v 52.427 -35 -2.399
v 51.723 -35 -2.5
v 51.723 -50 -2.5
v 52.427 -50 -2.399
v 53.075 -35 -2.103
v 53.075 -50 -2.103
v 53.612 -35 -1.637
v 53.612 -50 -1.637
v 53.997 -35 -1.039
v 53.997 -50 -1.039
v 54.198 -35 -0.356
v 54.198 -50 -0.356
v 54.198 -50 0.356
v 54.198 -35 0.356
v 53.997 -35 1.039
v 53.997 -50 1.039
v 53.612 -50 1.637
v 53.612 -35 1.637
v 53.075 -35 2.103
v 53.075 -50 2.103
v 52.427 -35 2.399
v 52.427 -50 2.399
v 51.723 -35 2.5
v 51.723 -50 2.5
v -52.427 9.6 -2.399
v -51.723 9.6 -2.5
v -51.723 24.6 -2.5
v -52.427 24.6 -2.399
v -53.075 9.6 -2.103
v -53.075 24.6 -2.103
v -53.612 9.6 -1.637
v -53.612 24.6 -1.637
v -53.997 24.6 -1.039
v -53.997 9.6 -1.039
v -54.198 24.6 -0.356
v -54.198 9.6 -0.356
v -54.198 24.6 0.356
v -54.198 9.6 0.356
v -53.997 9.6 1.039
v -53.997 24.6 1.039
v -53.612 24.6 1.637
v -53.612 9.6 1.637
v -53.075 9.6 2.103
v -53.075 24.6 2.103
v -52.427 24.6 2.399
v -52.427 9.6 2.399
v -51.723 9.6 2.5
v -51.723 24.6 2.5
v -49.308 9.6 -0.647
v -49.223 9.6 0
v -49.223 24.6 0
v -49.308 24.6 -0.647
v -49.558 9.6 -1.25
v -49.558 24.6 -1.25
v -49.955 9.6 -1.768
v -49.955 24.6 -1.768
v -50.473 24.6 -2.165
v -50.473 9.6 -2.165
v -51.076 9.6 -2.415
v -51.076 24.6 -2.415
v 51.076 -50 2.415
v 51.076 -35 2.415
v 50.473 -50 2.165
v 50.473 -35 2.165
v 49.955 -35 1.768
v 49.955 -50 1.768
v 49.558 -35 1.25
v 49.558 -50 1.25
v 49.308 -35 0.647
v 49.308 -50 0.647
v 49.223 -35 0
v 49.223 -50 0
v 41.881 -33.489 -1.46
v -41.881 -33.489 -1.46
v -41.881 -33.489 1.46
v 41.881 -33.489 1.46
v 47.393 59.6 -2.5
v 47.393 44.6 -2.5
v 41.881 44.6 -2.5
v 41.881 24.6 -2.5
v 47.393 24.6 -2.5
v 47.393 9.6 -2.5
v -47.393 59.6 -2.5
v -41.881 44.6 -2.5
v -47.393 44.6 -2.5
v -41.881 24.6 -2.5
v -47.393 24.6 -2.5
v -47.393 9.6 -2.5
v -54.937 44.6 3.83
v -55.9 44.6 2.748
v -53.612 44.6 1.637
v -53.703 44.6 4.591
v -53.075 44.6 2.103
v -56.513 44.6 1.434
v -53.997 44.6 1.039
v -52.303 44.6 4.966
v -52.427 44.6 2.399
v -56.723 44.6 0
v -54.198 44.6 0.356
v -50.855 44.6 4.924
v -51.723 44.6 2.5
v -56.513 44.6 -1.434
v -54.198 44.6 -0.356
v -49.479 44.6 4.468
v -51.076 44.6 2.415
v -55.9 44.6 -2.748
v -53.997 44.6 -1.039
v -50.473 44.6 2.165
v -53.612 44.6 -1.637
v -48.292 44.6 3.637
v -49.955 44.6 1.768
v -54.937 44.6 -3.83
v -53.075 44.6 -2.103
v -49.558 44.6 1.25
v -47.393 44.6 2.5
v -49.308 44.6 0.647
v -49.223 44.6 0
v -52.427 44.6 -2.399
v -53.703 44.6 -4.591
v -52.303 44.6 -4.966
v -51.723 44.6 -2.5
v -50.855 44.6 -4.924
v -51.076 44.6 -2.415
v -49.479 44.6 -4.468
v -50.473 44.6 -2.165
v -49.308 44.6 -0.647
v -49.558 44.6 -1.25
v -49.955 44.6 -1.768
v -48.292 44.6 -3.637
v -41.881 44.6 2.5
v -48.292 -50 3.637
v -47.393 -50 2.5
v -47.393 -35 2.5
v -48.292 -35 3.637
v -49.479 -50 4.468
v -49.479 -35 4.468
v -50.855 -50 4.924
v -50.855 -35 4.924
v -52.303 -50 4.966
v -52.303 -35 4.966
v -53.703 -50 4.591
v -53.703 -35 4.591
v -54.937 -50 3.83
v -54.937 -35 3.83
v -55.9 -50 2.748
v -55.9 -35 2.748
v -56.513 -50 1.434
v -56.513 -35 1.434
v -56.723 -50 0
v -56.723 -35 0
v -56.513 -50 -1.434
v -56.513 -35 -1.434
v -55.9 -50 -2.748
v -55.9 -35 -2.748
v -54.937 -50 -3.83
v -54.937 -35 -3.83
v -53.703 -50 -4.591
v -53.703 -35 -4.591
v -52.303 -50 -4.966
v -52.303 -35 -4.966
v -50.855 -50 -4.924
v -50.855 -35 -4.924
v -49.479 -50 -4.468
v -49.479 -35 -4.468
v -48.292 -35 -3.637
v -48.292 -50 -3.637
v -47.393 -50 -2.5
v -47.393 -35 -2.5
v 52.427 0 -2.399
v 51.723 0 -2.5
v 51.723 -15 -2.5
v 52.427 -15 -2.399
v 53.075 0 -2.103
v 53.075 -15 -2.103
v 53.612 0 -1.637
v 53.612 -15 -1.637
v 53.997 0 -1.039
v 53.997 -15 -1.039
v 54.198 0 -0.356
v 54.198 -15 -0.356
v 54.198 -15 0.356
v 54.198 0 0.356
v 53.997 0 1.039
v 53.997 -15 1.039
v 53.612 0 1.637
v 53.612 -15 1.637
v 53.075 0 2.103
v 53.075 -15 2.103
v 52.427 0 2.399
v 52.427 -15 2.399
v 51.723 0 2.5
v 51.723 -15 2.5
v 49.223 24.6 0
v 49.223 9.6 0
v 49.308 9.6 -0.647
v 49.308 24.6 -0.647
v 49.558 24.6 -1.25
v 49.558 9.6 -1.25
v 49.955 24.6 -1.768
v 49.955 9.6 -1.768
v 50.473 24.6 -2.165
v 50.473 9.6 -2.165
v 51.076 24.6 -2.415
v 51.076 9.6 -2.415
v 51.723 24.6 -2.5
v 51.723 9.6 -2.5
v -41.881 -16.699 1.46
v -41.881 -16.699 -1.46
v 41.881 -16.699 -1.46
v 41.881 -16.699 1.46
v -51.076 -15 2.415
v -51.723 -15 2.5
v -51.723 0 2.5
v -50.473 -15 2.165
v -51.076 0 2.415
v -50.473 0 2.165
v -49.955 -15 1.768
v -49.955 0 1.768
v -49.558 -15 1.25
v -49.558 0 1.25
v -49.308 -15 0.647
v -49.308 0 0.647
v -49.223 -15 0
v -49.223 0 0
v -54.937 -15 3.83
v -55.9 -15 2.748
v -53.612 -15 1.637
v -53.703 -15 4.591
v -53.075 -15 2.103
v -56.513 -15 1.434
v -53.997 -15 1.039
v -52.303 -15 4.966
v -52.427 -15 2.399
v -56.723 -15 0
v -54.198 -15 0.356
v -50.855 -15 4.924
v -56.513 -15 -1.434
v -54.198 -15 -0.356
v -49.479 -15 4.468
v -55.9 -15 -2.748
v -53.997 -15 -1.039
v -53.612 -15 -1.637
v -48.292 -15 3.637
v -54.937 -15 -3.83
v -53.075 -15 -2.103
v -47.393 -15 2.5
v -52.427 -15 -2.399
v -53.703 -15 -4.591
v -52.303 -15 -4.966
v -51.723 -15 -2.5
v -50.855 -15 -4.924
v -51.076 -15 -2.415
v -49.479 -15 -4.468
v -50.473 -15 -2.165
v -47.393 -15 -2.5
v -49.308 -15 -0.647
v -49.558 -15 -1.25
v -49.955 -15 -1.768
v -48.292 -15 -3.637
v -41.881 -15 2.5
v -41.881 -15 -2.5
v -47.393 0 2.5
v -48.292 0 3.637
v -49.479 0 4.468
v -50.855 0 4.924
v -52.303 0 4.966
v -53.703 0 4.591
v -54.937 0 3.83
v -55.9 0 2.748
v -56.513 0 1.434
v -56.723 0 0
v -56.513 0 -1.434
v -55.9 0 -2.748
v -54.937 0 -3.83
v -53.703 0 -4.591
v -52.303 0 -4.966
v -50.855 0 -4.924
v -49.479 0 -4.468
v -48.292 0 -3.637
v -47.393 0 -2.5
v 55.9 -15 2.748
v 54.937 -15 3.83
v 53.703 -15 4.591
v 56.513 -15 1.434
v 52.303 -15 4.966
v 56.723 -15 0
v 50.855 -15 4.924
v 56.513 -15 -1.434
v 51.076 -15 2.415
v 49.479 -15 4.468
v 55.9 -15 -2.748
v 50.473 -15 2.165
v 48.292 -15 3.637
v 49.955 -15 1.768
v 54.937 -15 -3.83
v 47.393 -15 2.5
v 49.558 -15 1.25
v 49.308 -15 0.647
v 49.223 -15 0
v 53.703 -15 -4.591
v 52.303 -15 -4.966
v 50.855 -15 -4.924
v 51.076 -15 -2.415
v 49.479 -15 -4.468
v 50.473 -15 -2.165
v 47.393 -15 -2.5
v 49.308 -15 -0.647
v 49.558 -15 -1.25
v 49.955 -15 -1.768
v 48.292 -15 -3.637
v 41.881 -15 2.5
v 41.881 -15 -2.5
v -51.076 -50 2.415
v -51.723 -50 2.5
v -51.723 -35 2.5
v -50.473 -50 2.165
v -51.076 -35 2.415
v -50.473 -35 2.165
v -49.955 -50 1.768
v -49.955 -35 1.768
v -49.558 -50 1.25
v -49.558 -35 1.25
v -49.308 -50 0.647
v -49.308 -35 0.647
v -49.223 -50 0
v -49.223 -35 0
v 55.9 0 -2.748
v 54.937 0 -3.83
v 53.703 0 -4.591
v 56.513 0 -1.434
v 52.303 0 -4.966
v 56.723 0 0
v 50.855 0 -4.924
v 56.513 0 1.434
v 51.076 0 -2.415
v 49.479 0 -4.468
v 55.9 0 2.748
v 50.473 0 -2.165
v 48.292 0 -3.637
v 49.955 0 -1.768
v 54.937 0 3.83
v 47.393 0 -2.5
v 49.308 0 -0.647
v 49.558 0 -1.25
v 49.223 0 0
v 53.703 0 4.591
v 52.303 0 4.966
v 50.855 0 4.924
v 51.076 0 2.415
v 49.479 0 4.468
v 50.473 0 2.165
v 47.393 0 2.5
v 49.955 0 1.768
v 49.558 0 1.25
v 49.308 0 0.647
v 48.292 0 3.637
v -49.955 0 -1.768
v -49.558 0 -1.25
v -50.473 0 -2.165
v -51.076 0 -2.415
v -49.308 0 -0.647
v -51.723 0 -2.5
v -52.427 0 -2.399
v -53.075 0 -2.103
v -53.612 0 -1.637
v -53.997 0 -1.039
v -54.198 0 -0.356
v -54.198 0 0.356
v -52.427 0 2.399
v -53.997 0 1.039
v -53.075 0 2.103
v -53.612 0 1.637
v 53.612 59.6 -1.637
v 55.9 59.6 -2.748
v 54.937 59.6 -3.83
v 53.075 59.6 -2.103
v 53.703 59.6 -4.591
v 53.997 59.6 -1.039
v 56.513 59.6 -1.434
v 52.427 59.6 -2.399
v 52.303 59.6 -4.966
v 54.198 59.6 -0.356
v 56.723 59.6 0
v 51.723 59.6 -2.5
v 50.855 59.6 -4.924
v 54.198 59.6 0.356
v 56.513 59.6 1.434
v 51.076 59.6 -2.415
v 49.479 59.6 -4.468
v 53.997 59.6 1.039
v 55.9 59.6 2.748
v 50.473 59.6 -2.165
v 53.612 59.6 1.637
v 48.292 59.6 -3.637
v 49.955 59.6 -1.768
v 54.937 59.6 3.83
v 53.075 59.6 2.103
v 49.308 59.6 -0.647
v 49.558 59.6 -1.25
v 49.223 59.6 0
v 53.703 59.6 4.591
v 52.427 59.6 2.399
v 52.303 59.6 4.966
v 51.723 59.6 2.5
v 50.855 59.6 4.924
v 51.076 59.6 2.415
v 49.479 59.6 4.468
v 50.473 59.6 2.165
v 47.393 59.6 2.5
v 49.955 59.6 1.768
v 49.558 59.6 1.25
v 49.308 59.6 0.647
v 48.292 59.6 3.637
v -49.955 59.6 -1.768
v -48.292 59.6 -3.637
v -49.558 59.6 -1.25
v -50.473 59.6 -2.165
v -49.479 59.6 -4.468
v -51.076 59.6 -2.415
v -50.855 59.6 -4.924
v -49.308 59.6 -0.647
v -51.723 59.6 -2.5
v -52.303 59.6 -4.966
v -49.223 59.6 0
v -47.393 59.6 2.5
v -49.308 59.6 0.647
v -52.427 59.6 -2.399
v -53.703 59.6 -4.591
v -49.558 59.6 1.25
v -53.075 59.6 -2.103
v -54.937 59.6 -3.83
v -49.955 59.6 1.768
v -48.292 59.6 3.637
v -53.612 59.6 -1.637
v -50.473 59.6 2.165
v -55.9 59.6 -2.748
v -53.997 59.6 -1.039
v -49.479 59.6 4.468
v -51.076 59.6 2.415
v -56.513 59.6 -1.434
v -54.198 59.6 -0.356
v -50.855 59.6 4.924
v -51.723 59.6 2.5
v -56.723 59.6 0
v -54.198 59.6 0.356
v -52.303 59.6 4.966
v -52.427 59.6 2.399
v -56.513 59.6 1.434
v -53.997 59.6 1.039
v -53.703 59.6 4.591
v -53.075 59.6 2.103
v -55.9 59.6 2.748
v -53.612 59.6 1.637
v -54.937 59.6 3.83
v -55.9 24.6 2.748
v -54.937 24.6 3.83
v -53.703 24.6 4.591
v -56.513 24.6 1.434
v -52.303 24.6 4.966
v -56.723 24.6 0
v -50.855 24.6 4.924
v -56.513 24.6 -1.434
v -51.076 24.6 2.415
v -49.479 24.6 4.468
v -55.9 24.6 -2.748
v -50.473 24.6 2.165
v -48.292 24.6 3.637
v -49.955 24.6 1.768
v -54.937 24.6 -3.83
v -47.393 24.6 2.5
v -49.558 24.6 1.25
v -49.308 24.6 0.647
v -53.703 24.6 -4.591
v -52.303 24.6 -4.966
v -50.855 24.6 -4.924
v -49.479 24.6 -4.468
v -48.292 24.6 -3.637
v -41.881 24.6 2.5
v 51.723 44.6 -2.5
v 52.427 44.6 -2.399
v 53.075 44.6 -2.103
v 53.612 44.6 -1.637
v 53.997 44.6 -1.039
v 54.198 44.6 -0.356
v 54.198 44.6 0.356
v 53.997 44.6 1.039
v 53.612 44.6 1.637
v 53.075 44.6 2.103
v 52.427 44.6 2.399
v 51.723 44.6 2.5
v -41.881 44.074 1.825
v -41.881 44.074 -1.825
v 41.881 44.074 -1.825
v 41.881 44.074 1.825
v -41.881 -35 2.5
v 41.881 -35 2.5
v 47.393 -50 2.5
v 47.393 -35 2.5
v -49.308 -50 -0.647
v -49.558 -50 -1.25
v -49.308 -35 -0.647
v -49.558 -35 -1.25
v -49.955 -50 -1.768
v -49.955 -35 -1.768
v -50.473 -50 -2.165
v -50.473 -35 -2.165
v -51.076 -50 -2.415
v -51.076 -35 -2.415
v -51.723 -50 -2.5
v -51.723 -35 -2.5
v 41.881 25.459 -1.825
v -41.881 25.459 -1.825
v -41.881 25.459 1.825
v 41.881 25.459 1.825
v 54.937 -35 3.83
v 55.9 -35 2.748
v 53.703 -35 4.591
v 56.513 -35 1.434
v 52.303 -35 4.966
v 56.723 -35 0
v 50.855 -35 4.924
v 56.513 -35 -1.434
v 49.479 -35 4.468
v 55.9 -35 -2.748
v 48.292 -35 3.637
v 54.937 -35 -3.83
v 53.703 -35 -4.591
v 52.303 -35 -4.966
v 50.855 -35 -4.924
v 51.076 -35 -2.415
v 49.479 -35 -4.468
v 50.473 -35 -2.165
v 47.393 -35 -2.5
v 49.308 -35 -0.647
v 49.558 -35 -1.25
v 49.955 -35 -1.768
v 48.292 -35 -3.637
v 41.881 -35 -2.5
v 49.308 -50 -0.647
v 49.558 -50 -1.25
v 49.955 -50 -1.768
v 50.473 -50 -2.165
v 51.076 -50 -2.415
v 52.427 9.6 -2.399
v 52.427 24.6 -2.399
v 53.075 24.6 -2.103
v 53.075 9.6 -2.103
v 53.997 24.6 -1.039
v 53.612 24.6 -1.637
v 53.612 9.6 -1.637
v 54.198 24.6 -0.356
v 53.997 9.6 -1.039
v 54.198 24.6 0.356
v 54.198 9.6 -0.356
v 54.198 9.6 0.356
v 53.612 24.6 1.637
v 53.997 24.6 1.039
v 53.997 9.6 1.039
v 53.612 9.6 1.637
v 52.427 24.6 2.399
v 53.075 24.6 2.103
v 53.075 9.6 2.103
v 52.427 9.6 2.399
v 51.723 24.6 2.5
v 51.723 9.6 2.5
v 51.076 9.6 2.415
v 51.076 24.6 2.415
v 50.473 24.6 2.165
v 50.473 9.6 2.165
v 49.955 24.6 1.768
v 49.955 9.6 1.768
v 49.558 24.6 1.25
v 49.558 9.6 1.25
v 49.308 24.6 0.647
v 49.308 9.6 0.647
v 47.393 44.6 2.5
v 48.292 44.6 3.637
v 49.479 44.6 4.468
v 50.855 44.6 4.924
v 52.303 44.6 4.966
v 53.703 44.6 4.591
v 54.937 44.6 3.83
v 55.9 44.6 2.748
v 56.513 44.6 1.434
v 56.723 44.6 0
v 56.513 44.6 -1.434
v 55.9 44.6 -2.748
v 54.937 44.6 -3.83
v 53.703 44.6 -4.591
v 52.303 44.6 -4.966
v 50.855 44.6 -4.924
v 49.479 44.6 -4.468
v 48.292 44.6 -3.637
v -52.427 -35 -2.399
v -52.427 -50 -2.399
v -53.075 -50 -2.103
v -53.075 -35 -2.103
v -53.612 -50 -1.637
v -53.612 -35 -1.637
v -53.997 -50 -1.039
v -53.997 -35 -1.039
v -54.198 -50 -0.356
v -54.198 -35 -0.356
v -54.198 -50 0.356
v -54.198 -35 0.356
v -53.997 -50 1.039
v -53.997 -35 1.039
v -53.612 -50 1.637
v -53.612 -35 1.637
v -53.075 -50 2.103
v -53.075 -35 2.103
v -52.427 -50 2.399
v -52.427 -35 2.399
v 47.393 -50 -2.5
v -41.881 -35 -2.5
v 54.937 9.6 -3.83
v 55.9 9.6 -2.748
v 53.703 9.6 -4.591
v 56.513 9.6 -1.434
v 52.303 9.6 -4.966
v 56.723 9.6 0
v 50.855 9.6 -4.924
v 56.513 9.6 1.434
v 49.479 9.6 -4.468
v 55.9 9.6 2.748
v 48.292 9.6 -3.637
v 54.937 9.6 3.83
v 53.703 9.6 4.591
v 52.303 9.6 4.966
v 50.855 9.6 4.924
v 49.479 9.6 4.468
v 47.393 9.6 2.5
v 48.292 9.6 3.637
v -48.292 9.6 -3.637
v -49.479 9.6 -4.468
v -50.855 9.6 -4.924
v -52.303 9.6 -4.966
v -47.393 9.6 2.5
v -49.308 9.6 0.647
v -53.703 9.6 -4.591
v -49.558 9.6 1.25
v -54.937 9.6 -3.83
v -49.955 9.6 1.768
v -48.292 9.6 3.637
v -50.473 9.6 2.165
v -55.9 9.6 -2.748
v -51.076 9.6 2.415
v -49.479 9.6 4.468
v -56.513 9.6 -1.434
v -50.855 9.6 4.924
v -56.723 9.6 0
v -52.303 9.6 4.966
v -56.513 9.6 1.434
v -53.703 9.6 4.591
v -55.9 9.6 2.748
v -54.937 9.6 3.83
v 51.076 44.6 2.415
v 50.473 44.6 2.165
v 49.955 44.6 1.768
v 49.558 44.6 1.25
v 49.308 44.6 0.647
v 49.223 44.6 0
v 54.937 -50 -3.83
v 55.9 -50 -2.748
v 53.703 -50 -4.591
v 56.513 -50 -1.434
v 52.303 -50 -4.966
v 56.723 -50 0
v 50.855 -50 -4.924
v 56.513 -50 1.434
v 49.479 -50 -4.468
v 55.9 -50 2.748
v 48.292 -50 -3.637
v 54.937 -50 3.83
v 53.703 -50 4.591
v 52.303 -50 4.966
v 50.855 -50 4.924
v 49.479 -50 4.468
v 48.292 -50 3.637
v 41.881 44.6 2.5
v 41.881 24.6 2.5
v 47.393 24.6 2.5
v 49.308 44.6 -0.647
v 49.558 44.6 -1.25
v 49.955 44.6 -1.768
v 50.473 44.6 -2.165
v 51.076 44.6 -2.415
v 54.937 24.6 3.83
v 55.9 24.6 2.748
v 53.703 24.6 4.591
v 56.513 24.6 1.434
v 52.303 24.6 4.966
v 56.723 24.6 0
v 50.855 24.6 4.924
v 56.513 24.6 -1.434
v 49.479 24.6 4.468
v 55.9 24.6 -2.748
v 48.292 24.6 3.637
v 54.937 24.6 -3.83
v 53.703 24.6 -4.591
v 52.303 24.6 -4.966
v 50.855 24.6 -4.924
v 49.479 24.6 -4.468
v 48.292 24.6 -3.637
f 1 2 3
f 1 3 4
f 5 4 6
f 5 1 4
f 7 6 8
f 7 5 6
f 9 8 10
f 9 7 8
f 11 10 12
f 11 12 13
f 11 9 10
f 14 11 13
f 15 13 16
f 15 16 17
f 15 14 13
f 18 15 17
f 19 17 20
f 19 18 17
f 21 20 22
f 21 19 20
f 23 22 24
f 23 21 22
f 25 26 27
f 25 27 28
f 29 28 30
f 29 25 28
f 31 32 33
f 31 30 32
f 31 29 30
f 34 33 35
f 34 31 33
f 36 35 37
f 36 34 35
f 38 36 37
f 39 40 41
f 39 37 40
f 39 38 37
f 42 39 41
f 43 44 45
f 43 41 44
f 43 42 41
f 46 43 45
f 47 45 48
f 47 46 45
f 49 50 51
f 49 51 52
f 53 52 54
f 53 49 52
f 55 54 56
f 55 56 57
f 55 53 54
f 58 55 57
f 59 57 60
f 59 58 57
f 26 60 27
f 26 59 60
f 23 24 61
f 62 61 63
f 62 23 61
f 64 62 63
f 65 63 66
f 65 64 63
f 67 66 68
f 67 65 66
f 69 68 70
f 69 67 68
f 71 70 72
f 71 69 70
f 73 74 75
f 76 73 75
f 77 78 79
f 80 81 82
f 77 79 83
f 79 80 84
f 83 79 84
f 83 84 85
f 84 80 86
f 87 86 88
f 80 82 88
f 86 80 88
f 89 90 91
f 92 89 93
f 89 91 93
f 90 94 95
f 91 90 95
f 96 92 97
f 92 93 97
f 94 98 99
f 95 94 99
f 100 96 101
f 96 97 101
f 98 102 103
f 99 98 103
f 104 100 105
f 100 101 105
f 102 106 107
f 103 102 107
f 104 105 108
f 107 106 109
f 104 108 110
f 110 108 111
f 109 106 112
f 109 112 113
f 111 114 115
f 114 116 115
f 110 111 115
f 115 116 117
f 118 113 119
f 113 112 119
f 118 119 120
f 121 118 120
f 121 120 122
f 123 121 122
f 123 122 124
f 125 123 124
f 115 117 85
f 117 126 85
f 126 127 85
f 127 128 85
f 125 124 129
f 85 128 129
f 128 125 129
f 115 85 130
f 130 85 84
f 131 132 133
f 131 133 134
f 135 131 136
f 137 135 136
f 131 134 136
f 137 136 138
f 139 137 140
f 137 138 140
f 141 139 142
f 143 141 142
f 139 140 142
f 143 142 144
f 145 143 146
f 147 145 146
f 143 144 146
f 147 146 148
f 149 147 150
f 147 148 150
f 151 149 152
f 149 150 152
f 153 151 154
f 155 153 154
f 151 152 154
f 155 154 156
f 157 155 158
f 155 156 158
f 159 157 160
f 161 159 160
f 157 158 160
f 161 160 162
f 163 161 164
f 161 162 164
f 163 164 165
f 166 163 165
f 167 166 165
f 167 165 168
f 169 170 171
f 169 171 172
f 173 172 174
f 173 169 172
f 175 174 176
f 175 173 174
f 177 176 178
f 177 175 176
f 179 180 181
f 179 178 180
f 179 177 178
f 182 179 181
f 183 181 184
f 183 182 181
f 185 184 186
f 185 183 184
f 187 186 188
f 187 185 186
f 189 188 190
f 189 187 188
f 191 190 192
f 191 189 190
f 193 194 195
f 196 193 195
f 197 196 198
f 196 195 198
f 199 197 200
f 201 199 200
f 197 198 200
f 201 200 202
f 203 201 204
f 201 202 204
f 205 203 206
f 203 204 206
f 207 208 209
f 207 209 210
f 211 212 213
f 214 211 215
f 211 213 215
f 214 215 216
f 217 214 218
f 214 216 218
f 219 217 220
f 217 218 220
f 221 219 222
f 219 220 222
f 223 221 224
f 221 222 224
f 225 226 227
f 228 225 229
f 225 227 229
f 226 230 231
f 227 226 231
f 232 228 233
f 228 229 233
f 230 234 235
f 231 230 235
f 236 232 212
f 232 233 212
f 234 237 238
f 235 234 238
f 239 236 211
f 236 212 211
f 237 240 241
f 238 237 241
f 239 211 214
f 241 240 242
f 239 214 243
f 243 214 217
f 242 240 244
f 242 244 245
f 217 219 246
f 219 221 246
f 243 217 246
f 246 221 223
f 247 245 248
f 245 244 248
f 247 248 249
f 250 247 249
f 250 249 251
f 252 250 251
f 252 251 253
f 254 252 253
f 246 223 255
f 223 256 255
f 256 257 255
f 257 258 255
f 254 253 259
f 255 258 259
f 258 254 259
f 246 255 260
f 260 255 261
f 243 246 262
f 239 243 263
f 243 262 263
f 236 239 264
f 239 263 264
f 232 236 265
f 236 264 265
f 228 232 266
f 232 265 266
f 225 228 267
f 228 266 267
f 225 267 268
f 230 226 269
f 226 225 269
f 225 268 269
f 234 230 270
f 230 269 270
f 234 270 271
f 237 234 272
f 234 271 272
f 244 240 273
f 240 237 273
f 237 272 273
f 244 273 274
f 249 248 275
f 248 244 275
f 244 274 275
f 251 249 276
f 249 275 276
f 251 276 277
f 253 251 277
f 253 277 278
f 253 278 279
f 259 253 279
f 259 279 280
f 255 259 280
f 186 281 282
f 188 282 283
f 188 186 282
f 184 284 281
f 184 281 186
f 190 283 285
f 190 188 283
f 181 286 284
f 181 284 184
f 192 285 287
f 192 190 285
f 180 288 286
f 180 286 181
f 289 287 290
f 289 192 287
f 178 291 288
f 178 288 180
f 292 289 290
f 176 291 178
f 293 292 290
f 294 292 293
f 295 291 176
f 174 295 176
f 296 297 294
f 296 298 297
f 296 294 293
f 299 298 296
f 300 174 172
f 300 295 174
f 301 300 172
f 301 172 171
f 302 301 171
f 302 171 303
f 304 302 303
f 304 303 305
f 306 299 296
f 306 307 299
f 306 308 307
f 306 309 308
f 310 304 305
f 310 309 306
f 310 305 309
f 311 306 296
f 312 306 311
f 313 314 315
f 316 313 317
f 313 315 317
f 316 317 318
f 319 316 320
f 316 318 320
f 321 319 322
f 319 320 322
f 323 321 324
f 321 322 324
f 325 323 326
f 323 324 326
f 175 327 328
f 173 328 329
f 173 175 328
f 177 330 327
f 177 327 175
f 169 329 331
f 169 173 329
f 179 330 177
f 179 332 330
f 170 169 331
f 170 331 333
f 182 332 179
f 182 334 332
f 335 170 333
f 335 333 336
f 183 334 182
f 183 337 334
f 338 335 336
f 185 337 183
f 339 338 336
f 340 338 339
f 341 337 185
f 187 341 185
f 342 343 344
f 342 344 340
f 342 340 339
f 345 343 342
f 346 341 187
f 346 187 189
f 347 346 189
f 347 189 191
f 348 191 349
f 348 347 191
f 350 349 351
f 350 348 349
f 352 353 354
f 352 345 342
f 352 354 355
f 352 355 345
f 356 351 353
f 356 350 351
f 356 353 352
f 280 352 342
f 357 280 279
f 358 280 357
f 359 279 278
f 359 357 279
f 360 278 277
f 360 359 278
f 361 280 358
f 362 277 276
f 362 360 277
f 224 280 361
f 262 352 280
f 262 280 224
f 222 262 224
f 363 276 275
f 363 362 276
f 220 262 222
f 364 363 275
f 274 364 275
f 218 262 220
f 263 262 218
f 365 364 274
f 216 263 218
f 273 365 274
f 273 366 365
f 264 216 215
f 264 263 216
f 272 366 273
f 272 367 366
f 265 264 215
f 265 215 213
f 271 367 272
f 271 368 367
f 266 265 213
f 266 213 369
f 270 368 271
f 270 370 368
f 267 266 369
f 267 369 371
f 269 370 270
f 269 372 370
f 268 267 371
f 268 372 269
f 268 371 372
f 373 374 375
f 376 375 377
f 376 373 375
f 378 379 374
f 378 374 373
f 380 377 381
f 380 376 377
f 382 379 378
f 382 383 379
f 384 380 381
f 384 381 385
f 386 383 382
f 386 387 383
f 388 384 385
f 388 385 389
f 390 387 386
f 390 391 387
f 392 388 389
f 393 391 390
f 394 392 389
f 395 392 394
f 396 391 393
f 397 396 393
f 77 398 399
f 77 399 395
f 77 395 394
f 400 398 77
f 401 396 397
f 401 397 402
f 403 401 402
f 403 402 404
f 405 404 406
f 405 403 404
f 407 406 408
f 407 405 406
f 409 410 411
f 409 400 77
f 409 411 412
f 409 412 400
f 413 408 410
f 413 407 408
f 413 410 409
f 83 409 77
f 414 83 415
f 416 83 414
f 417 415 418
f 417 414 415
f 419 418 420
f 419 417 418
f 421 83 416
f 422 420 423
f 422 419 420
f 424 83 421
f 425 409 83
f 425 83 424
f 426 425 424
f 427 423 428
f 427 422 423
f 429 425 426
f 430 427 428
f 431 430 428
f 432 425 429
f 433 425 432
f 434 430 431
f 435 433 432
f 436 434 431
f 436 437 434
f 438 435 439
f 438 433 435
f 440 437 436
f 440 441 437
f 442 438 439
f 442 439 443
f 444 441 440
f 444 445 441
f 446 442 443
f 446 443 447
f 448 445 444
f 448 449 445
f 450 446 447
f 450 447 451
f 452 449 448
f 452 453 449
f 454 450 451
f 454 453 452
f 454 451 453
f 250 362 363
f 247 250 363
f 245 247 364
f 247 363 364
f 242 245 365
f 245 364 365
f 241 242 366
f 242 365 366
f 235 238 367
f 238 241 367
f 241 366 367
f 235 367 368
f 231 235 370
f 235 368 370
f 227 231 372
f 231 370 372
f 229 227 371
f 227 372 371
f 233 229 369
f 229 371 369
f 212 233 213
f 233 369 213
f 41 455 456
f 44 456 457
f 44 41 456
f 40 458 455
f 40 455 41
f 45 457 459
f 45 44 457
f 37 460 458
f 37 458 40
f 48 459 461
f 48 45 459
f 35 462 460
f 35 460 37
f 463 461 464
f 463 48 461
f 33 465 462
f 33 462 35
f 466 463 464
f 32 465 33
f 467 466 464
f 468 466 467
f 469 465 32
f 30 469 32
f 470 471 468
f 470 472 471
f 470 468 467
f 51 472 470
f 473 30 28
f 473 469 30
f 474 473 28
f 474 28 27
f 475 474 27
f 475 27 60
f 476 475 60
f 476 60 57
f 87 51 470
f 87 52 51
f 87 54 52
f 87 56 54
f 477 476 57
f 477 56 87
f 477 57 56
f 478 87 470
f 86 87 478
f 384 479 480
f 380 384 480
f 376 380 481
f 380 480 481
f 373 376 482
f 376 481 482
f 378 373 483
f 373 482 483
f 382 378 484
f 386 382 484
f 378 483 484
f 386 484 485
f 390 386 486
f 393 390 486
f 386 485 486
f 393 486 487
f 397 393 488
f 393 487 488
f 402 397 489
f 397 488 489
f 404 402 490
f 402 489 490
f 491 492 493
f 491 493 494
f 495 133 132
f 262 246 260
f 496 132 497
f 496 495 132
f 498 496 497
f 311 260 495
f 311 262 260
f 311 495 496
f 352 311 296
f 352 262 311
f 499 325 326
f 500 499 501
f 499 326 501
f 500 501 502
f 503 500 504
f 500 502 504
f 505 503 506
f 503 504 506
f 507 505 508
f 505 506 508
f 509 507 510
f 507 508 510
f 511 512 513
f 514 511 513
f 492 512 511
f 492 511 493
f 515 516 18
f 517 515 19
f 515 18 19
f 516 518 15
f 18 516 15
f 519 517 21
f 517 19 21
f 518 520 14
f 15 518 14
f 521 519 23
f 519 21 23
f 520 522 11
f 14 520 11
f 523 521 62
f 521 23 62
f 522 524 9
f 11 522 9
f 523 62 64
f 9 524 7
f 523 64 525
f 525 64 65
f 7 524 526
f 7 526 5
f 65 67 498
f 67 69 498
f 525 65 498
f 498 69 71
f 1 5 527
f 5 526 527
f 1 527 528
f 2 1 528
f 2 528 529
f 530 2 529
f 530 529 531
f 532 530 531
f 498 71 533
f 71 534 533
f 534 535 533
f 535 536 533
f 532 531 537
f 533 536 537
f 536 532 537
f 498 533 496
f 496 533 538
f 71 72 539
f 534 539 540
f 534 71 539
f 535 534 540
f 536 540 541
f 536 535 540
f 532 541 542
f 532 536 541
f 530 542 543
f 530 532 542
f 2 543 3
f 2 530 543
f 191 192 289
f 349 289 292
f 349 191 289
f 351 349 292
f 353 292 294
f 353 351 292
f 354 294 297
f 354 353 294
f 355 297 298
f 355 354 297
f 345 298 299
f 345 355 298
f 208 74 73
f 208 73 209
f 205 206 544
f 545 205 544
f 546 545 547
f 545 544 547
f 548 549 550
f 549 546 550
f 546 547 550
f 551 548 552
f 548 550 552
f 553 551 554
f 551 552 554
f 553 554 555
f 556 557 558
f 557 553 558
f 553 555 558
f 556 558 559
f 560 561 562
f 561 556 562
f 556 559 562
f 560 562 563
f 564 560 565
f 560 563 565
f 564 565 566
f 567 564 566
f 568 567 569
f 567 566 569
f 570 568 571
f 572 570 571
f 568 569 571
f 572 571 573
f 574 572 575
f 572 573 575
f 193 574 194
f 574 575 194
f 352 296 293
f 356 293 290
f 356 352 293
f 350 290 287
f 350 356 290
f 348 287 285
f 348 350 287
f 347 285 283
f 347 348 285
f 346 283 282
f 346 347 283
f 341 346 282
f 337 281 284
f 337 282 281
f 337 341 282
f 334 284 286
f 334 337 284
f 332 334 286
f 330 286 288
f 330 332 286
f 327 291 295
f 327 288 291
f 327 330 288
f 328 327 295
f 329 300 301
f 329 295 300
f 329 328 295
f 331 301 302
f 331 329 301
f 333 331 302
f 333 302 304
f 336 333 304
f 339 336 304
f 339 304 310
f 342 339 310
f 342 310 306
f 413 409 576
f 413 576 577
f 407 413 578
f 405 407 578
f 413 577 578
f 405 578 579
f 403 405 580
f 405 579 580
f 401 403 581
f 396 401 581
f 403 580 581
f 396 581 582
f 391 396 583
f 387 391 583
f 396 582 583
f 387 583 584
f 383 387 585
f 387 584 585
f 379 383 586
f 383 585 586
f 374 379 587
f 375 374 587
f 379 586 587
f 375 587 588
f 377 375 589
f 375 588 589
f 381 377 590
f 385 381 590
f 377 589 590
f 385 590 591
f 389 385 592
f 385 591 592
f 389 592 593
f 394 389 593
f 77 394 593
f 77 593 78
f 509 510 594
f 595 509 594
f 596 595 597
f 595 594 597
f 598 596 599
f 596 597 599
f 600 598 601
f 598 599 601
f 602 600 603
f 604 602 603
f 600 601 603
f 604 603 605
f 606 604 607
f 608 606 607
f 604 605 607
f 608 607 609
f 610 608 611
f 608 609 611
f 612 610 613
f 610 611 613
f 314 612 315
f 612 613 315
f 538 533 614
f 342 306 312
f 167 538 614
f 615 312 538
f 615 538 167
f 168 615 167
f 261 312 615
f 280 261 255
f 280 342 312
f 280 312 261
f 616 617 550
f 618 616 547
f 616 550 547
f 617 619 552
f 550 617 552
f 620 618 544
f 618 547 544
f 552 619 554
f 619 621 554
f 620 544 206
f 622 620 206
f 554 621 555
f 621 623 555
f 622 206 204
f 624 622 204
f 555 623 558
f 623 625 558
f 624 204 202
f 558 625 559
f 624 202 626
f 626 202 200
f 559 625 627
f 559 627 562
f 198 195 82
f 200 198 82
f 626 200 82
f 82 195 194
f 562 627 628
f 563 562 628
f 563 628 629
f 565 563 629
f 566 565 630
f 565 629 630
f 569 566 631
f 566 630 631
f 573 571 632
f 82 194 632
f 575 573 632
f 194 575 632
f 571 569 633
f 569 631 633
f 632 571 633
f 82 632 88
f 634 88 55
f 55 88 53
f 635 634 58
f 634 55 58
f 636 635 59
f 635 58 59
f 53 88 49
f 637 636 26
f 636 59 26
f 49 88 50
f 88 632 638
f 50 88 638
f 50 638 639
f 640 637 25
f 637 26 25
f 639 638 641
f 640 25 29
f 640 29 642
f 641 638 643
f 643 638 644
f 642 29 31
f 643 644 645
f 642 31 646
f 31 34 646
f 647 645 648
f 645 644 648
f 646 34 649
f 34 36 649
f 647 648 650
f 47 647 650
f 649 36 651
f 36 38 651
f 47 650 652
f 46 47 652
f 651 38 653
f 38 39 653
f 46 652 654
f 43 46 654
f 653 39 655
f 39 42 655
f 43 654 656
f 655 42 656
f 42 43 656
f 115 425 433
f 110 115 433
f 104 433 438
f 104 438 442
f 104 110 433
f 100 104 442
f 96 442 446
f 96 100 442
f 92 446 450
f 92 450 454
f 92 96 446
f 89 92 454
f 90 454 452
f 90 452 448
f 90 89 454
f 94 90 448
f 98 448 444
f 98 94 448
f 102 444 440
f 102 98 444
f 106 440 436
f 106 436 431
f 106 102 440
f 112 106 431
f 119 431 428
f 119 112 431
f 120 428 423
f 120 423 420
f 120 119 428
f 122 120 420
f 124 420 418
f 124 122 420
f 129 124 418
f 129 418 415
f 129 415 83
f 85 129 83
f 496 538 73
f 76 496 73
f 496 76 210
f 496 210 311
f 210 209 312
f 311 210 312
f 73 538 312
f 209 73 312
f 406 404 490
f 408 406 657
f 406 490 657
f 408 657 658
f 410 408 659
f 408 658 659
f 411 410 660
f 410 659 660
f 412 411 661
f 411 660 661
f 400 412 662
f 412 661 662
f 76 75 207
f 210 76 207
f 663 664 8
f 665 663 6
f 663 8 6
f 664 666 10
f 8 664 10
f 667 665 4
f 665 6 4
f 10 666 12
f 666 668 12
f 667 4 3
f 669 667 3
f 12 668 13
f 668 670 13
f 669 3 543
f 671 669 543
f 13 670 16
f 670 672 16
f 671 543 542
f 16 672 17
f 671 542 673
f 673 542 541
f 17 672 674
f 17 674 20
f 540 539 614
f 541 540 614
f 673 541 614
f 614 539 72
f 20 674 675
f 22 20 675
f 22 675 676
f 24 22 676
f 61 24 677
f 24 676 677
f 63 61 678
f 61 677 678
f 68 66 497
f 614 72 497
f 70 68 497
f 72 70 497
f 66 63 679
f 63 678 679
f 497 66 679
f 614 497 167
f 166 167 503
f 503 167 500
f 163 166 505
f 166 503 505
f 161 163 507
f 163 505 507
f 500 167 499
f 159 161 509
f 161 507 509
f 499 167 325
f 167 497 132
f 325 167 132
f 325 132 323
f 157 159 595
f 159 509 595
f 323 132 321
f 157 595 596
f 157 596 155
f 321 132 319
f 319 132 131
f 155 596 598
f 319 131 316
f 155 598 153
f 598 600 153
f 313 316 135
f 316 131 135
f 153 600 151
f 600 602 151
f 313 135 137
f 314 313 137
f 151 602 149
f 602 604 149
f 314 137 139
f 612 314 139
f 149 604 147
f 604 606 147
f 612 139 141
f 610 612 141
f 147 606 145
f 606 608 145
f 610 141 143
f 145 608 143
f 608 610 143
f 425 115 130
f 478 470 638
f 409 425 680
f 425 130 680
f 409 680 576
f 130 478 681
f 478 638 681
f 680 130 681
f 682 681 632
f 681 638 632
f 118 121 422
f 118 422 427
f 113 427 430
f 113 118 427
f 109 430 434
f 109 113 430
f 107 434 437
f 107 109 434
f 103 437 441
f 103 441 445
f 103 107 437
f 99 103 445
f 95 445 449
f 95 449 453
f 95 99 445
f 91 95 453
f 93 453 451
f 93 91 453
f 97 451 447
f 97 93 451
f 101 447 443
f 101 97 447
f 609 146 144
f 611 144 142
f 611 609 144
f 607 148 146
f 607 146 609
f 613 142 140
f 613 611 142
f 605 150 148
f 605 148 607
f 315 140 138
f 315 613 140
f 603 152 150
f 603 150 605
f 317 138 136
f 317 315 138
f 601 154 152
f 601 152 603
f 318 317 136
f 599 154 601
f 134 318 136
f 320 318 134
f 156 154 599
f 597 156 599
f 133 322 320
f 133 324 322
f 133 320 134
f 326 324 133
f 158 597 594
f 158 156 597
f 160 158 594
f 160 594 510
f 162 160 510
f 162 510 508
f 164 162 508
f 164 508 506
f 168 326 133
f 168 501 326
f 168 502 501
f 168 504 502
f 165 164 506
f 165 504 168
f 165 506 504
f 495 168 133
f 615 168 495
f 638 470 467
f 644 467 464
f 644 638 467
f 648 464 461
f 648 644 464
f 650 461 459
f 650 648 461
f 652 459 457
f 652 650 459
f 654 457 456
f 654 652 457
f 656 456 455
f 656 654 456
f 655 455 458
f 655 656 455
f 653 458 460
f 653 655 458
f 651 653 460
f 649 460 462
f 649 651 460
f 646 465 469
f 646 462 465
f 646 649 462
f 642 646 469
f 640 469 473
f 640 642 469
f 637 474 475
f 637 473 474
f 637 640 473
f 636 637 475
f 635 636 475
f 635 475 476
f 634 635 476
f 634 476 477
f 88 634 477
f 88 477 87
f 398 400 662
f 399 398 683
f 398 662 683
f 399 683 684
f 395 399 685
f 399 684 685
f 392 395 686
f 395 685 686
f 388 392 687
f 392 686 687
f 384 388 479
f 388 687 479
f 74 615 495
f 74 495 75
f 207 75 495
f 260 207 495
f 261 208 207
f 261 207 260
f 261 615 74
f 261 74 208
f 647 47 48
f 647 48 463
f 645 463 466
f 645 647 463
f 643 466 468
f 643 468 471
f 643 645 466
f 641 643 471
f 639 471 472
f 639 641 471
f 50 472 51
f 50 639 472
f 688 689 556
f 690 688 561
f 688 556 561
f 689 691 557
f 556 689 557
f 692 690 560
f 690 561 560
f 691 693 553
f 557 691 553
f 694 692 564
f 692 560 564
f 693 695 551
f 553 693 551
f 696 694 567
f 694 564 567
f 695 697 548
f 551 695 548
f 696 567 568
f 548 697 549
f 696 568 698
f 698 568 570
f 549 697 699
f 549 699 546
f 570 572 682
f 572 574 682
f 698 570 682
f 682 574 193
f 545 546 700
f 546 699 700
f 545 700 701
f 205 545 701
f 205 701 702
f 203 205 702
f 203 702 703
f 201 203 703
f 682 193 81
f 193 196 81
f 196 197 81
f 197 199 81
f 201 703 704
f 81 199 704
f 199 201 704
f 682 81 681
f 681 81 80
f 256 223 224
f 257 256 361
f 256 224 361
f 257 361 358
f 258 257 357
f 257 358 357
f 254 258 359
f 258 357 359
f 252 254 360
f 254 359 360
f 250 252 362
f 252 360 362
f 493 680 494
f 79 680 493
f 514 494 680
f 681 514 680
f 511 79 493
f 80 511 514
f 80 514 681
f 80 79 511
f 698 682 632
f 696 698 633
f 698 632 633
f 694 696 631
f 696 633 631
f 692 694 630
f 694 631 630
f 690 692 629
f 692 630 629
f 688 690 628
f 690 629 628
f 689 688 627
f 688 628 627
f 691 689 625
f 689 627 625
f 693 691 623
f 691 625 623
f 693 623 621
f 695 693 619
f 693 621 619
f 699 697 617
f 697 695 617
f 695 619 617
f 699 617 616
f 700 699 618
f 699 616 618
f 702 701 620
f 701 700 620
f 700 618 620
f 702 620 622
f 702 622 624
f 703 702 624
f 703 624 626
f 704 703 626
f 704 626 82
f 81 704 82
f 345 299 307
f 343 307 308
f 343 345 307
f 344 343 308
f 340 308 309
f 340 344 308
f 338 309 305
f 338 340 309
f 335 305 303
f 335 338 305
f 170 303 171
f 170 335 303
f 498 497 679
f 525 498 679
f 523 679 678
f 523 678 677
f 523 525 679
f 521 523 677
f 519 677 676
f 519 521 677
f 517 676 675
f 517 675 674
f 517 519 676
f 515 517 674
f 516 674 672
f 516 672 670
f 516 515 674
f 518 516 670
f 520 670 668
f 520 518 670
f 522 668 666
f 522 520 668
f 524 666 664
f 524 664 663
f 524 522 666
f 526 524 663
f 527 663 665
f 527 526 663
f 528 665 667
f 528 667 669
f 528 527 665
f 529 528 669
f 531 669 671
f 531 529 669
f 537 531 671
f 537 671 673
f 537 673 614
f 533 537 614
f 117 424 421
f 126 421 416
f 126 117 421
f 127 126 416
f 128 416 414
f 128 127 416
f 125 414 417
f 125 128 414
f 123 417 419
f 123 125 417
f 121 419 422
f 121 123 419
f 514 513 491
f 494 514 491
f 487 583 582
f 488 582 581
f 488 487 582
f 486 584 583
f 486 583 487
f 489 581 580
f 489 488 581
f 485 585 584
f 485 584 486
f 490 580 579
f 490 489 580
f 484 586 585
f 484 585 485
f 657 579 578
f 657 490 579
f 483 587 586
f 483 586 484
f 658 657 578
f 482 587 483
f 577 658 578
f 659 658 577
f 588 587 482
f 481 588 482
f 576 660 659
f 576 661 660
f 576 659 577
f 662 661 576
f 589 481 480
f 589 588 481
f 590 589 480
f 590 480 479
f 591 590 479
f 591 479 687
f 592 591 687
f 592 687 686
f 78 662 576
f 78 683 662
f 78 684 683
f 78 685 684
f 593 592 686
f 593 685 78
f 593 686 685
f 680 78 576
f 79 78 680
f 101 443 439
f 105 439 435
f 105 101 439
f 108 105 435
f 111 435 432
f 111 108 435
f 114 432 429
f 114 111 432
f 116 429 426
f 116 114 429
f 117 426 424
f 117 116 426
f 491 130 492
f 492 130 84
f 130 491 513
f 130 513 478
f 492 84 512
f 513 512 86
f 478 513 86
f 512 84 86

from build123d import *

# Parameters (mm, degrees)
F1_DEPTH       = 50
F2_W           = 28.940089047
F2_H           = 20
F3_DEPTH       = 25
F3_DEPTH_BACK  = 25
F4_W           = 72.1798986197
F4_H           = 54.933372885
F5_DEPTH       = 25
F5_DEPTH_BACK  = 25
F9_W           = 16.7902670801
F9_H           = 2.9200464487
F10_DEPTH      = 63
F10_DEPTH_BACK = 65.8
F11_W          = 18.6153054237
F11_H          = 3.6500580609
F12_DEPTH      = 56.8
F12_DEPTH_BACK = 55.3


with BuildPart() as f1:
    # F0 (on Front) → F1 (new body)
    with BuildSketch(Plane.XZ):
        with BuildLine():
            ThreePointArc((55.5247060955, -2.5), (53.0247060955, 0), (55.5247060955, 2.5))
            Line((55.5247060955, 2.5), (51.1945790765, 2.5))
            ThreePointArc((51.1945790765, 2.5), (50.5247060955, 0), (51.1945790765, -2.5))
            Line((51.1945790765, -2.5), (55.5247060955, -2.5))
        make_face()
        with BuildLine():
            Line((51.1945790765, 2.5), (55.5247060955, 2.5))
            ThreePointArc((55.5247060955, 2.5), (57.2924730484, 1.767766953), (58.0247060955, 0))
            ThreePointArc((58.0247060955, 0), (57.2924730484, -1.767766953), (55.5247060955, -2.5))
            Line((55.5247060955, -2.5), (51.1945790765, -2.5))
            ThreePointArc((51.1945790765, -2.5), (56.818801321, -4.8296291314), (60.5247060955, 0))
            ThreePointArc((60.5247060955, 0), (56.818801321, 4.8296291314), (51.1945790765, 2.5))
        make_face()
        with BuildLine():
            ThreePointArc((51.1945790765, -2.5), (50.5247060955, 0), (51.1945790765, 2.5))
            Line((51.1945790765, 2.5), (-47.3928899846, 2.5))
            ThreePointArc((-47.3928899846, 2.5), (-46.893387872, 1.2940952255), (-46.7230170035, 0))
            ThreePointArc((-46.7230170035, 0), (-46.893387872, -1.2940952255), (-47.3928899846, -2.5))
            Line((-47.3928899846, -2.5), (51.1945790765, -2.5))
        make_face()
        with BuildLine():
            ThreePointArc((-46.7230170035, 0), (-46.893387872, 1.2940952255), (-47.3928899846, 2.5))
            Line((-47.3928899846, 2.5), (-51.7230170035, 2.5))
            ThreePointArc((-51.7230170035, 2.5), (-49.9552500505, 1.767766953), (-49.2230170035, 0))
            ThreePointArc((-49.2230170035, 0), (-49.9552500505, -1.767766953), (-51.7230170035, -2.5))
            Line((-51.7230170035, -2.5), (-47.3928899846, -2.5))
            ThreePointArc((-47.3928899846, -2.5), (-46.893387872, -1.2940952255), (-46.7230170035, 0))
        make_face()
        with BuildLine():
            Line((-51.7230170035, 2.5), (-47.3928899846, 2.5))
            ThreePointArc((-47.3928899846, 2.5), (-56.7230170035, 0), (-47.3928899846, -2.5))
            Line((-47.3928899846, -2.5), (-51.7230170035, -2.5))
            ThreePointArc((-51.7230170035, -2.5), (-54.2230170035, 0), (-51.7230170035, 2.5))
        make_face()
    extrude(amount=F1_DEPTH)

    # F2 (on Top) → F3 (cut, two sides)
    with BuildSketch(Plane.XY) as f3_sk:
        with Locations((-56.3514307141, -25)):
            Rectangle(F2_W, F2_H)
    extrude(amount=-F3_DEPTH, mode=Mode.SUBTRACT)
    extrude(f3_sk.sketch, amount=F3_DEPTH_BACK, mode=Mode.SUBTRACT)

    # F4 (on Top) → F5 (cut, two sides)
    with BuildSketch(Plane.XY) as f5_sk:
        with Locations((36.0899493098, -27.4666864425)):
            Rectangle(F4_W, F4_H)
    extrude(amount=-F5_DEPTH, mode=Mode.SUBTRACT)
    extrude(f5_sk.sketch, amount=F5_DEPTH_BACK, mode=Mode.SUBTRACT)

    # F6: F1 across plane


with BuildPart() as f1_1:
    add(f1.part)
    add(f1.part.mirror(Plane.YZ))


with BuildPart() as f8_1:
    # F8: instance of F1
    add(f1_1.part.mirror(Plane.XZ.offset(-4.8)))

    # F11 (on Right) → F12 (cut, two sides)
    with BuildSketch(Plane.YZ) as f12_sk:
        with Locations((34.7668007016, 0)):
            Rectangle(F11_W, F11_H)
    extrude(amount=F12_DEPTH, mode=Mode.SUBTRACT)
    extrude(f12_sk.sketch, amount=-F12_DEPTH_BACK, mode=Mode.SUBTRACT)


with BuildPart() as f1_2:
    add(f1_1.part)

    # F9 (on Right) → F10 (cut, two sides)
    with BuildSketch(Plane.YZ) as f10_sk:
        with Locations((-25.0941496342, 0)):
            Rectangle(F9_W, F9_H)
    extrude(amount=F10_DEPTH, mode=Mode.SUBTRACT)
    extrude(f10_sk.sketch, amount=-F10_DEPTH_BACK, mode=Mode.SUBTRACT)


solid = Compound([f8_1.part, f1_2.part])
